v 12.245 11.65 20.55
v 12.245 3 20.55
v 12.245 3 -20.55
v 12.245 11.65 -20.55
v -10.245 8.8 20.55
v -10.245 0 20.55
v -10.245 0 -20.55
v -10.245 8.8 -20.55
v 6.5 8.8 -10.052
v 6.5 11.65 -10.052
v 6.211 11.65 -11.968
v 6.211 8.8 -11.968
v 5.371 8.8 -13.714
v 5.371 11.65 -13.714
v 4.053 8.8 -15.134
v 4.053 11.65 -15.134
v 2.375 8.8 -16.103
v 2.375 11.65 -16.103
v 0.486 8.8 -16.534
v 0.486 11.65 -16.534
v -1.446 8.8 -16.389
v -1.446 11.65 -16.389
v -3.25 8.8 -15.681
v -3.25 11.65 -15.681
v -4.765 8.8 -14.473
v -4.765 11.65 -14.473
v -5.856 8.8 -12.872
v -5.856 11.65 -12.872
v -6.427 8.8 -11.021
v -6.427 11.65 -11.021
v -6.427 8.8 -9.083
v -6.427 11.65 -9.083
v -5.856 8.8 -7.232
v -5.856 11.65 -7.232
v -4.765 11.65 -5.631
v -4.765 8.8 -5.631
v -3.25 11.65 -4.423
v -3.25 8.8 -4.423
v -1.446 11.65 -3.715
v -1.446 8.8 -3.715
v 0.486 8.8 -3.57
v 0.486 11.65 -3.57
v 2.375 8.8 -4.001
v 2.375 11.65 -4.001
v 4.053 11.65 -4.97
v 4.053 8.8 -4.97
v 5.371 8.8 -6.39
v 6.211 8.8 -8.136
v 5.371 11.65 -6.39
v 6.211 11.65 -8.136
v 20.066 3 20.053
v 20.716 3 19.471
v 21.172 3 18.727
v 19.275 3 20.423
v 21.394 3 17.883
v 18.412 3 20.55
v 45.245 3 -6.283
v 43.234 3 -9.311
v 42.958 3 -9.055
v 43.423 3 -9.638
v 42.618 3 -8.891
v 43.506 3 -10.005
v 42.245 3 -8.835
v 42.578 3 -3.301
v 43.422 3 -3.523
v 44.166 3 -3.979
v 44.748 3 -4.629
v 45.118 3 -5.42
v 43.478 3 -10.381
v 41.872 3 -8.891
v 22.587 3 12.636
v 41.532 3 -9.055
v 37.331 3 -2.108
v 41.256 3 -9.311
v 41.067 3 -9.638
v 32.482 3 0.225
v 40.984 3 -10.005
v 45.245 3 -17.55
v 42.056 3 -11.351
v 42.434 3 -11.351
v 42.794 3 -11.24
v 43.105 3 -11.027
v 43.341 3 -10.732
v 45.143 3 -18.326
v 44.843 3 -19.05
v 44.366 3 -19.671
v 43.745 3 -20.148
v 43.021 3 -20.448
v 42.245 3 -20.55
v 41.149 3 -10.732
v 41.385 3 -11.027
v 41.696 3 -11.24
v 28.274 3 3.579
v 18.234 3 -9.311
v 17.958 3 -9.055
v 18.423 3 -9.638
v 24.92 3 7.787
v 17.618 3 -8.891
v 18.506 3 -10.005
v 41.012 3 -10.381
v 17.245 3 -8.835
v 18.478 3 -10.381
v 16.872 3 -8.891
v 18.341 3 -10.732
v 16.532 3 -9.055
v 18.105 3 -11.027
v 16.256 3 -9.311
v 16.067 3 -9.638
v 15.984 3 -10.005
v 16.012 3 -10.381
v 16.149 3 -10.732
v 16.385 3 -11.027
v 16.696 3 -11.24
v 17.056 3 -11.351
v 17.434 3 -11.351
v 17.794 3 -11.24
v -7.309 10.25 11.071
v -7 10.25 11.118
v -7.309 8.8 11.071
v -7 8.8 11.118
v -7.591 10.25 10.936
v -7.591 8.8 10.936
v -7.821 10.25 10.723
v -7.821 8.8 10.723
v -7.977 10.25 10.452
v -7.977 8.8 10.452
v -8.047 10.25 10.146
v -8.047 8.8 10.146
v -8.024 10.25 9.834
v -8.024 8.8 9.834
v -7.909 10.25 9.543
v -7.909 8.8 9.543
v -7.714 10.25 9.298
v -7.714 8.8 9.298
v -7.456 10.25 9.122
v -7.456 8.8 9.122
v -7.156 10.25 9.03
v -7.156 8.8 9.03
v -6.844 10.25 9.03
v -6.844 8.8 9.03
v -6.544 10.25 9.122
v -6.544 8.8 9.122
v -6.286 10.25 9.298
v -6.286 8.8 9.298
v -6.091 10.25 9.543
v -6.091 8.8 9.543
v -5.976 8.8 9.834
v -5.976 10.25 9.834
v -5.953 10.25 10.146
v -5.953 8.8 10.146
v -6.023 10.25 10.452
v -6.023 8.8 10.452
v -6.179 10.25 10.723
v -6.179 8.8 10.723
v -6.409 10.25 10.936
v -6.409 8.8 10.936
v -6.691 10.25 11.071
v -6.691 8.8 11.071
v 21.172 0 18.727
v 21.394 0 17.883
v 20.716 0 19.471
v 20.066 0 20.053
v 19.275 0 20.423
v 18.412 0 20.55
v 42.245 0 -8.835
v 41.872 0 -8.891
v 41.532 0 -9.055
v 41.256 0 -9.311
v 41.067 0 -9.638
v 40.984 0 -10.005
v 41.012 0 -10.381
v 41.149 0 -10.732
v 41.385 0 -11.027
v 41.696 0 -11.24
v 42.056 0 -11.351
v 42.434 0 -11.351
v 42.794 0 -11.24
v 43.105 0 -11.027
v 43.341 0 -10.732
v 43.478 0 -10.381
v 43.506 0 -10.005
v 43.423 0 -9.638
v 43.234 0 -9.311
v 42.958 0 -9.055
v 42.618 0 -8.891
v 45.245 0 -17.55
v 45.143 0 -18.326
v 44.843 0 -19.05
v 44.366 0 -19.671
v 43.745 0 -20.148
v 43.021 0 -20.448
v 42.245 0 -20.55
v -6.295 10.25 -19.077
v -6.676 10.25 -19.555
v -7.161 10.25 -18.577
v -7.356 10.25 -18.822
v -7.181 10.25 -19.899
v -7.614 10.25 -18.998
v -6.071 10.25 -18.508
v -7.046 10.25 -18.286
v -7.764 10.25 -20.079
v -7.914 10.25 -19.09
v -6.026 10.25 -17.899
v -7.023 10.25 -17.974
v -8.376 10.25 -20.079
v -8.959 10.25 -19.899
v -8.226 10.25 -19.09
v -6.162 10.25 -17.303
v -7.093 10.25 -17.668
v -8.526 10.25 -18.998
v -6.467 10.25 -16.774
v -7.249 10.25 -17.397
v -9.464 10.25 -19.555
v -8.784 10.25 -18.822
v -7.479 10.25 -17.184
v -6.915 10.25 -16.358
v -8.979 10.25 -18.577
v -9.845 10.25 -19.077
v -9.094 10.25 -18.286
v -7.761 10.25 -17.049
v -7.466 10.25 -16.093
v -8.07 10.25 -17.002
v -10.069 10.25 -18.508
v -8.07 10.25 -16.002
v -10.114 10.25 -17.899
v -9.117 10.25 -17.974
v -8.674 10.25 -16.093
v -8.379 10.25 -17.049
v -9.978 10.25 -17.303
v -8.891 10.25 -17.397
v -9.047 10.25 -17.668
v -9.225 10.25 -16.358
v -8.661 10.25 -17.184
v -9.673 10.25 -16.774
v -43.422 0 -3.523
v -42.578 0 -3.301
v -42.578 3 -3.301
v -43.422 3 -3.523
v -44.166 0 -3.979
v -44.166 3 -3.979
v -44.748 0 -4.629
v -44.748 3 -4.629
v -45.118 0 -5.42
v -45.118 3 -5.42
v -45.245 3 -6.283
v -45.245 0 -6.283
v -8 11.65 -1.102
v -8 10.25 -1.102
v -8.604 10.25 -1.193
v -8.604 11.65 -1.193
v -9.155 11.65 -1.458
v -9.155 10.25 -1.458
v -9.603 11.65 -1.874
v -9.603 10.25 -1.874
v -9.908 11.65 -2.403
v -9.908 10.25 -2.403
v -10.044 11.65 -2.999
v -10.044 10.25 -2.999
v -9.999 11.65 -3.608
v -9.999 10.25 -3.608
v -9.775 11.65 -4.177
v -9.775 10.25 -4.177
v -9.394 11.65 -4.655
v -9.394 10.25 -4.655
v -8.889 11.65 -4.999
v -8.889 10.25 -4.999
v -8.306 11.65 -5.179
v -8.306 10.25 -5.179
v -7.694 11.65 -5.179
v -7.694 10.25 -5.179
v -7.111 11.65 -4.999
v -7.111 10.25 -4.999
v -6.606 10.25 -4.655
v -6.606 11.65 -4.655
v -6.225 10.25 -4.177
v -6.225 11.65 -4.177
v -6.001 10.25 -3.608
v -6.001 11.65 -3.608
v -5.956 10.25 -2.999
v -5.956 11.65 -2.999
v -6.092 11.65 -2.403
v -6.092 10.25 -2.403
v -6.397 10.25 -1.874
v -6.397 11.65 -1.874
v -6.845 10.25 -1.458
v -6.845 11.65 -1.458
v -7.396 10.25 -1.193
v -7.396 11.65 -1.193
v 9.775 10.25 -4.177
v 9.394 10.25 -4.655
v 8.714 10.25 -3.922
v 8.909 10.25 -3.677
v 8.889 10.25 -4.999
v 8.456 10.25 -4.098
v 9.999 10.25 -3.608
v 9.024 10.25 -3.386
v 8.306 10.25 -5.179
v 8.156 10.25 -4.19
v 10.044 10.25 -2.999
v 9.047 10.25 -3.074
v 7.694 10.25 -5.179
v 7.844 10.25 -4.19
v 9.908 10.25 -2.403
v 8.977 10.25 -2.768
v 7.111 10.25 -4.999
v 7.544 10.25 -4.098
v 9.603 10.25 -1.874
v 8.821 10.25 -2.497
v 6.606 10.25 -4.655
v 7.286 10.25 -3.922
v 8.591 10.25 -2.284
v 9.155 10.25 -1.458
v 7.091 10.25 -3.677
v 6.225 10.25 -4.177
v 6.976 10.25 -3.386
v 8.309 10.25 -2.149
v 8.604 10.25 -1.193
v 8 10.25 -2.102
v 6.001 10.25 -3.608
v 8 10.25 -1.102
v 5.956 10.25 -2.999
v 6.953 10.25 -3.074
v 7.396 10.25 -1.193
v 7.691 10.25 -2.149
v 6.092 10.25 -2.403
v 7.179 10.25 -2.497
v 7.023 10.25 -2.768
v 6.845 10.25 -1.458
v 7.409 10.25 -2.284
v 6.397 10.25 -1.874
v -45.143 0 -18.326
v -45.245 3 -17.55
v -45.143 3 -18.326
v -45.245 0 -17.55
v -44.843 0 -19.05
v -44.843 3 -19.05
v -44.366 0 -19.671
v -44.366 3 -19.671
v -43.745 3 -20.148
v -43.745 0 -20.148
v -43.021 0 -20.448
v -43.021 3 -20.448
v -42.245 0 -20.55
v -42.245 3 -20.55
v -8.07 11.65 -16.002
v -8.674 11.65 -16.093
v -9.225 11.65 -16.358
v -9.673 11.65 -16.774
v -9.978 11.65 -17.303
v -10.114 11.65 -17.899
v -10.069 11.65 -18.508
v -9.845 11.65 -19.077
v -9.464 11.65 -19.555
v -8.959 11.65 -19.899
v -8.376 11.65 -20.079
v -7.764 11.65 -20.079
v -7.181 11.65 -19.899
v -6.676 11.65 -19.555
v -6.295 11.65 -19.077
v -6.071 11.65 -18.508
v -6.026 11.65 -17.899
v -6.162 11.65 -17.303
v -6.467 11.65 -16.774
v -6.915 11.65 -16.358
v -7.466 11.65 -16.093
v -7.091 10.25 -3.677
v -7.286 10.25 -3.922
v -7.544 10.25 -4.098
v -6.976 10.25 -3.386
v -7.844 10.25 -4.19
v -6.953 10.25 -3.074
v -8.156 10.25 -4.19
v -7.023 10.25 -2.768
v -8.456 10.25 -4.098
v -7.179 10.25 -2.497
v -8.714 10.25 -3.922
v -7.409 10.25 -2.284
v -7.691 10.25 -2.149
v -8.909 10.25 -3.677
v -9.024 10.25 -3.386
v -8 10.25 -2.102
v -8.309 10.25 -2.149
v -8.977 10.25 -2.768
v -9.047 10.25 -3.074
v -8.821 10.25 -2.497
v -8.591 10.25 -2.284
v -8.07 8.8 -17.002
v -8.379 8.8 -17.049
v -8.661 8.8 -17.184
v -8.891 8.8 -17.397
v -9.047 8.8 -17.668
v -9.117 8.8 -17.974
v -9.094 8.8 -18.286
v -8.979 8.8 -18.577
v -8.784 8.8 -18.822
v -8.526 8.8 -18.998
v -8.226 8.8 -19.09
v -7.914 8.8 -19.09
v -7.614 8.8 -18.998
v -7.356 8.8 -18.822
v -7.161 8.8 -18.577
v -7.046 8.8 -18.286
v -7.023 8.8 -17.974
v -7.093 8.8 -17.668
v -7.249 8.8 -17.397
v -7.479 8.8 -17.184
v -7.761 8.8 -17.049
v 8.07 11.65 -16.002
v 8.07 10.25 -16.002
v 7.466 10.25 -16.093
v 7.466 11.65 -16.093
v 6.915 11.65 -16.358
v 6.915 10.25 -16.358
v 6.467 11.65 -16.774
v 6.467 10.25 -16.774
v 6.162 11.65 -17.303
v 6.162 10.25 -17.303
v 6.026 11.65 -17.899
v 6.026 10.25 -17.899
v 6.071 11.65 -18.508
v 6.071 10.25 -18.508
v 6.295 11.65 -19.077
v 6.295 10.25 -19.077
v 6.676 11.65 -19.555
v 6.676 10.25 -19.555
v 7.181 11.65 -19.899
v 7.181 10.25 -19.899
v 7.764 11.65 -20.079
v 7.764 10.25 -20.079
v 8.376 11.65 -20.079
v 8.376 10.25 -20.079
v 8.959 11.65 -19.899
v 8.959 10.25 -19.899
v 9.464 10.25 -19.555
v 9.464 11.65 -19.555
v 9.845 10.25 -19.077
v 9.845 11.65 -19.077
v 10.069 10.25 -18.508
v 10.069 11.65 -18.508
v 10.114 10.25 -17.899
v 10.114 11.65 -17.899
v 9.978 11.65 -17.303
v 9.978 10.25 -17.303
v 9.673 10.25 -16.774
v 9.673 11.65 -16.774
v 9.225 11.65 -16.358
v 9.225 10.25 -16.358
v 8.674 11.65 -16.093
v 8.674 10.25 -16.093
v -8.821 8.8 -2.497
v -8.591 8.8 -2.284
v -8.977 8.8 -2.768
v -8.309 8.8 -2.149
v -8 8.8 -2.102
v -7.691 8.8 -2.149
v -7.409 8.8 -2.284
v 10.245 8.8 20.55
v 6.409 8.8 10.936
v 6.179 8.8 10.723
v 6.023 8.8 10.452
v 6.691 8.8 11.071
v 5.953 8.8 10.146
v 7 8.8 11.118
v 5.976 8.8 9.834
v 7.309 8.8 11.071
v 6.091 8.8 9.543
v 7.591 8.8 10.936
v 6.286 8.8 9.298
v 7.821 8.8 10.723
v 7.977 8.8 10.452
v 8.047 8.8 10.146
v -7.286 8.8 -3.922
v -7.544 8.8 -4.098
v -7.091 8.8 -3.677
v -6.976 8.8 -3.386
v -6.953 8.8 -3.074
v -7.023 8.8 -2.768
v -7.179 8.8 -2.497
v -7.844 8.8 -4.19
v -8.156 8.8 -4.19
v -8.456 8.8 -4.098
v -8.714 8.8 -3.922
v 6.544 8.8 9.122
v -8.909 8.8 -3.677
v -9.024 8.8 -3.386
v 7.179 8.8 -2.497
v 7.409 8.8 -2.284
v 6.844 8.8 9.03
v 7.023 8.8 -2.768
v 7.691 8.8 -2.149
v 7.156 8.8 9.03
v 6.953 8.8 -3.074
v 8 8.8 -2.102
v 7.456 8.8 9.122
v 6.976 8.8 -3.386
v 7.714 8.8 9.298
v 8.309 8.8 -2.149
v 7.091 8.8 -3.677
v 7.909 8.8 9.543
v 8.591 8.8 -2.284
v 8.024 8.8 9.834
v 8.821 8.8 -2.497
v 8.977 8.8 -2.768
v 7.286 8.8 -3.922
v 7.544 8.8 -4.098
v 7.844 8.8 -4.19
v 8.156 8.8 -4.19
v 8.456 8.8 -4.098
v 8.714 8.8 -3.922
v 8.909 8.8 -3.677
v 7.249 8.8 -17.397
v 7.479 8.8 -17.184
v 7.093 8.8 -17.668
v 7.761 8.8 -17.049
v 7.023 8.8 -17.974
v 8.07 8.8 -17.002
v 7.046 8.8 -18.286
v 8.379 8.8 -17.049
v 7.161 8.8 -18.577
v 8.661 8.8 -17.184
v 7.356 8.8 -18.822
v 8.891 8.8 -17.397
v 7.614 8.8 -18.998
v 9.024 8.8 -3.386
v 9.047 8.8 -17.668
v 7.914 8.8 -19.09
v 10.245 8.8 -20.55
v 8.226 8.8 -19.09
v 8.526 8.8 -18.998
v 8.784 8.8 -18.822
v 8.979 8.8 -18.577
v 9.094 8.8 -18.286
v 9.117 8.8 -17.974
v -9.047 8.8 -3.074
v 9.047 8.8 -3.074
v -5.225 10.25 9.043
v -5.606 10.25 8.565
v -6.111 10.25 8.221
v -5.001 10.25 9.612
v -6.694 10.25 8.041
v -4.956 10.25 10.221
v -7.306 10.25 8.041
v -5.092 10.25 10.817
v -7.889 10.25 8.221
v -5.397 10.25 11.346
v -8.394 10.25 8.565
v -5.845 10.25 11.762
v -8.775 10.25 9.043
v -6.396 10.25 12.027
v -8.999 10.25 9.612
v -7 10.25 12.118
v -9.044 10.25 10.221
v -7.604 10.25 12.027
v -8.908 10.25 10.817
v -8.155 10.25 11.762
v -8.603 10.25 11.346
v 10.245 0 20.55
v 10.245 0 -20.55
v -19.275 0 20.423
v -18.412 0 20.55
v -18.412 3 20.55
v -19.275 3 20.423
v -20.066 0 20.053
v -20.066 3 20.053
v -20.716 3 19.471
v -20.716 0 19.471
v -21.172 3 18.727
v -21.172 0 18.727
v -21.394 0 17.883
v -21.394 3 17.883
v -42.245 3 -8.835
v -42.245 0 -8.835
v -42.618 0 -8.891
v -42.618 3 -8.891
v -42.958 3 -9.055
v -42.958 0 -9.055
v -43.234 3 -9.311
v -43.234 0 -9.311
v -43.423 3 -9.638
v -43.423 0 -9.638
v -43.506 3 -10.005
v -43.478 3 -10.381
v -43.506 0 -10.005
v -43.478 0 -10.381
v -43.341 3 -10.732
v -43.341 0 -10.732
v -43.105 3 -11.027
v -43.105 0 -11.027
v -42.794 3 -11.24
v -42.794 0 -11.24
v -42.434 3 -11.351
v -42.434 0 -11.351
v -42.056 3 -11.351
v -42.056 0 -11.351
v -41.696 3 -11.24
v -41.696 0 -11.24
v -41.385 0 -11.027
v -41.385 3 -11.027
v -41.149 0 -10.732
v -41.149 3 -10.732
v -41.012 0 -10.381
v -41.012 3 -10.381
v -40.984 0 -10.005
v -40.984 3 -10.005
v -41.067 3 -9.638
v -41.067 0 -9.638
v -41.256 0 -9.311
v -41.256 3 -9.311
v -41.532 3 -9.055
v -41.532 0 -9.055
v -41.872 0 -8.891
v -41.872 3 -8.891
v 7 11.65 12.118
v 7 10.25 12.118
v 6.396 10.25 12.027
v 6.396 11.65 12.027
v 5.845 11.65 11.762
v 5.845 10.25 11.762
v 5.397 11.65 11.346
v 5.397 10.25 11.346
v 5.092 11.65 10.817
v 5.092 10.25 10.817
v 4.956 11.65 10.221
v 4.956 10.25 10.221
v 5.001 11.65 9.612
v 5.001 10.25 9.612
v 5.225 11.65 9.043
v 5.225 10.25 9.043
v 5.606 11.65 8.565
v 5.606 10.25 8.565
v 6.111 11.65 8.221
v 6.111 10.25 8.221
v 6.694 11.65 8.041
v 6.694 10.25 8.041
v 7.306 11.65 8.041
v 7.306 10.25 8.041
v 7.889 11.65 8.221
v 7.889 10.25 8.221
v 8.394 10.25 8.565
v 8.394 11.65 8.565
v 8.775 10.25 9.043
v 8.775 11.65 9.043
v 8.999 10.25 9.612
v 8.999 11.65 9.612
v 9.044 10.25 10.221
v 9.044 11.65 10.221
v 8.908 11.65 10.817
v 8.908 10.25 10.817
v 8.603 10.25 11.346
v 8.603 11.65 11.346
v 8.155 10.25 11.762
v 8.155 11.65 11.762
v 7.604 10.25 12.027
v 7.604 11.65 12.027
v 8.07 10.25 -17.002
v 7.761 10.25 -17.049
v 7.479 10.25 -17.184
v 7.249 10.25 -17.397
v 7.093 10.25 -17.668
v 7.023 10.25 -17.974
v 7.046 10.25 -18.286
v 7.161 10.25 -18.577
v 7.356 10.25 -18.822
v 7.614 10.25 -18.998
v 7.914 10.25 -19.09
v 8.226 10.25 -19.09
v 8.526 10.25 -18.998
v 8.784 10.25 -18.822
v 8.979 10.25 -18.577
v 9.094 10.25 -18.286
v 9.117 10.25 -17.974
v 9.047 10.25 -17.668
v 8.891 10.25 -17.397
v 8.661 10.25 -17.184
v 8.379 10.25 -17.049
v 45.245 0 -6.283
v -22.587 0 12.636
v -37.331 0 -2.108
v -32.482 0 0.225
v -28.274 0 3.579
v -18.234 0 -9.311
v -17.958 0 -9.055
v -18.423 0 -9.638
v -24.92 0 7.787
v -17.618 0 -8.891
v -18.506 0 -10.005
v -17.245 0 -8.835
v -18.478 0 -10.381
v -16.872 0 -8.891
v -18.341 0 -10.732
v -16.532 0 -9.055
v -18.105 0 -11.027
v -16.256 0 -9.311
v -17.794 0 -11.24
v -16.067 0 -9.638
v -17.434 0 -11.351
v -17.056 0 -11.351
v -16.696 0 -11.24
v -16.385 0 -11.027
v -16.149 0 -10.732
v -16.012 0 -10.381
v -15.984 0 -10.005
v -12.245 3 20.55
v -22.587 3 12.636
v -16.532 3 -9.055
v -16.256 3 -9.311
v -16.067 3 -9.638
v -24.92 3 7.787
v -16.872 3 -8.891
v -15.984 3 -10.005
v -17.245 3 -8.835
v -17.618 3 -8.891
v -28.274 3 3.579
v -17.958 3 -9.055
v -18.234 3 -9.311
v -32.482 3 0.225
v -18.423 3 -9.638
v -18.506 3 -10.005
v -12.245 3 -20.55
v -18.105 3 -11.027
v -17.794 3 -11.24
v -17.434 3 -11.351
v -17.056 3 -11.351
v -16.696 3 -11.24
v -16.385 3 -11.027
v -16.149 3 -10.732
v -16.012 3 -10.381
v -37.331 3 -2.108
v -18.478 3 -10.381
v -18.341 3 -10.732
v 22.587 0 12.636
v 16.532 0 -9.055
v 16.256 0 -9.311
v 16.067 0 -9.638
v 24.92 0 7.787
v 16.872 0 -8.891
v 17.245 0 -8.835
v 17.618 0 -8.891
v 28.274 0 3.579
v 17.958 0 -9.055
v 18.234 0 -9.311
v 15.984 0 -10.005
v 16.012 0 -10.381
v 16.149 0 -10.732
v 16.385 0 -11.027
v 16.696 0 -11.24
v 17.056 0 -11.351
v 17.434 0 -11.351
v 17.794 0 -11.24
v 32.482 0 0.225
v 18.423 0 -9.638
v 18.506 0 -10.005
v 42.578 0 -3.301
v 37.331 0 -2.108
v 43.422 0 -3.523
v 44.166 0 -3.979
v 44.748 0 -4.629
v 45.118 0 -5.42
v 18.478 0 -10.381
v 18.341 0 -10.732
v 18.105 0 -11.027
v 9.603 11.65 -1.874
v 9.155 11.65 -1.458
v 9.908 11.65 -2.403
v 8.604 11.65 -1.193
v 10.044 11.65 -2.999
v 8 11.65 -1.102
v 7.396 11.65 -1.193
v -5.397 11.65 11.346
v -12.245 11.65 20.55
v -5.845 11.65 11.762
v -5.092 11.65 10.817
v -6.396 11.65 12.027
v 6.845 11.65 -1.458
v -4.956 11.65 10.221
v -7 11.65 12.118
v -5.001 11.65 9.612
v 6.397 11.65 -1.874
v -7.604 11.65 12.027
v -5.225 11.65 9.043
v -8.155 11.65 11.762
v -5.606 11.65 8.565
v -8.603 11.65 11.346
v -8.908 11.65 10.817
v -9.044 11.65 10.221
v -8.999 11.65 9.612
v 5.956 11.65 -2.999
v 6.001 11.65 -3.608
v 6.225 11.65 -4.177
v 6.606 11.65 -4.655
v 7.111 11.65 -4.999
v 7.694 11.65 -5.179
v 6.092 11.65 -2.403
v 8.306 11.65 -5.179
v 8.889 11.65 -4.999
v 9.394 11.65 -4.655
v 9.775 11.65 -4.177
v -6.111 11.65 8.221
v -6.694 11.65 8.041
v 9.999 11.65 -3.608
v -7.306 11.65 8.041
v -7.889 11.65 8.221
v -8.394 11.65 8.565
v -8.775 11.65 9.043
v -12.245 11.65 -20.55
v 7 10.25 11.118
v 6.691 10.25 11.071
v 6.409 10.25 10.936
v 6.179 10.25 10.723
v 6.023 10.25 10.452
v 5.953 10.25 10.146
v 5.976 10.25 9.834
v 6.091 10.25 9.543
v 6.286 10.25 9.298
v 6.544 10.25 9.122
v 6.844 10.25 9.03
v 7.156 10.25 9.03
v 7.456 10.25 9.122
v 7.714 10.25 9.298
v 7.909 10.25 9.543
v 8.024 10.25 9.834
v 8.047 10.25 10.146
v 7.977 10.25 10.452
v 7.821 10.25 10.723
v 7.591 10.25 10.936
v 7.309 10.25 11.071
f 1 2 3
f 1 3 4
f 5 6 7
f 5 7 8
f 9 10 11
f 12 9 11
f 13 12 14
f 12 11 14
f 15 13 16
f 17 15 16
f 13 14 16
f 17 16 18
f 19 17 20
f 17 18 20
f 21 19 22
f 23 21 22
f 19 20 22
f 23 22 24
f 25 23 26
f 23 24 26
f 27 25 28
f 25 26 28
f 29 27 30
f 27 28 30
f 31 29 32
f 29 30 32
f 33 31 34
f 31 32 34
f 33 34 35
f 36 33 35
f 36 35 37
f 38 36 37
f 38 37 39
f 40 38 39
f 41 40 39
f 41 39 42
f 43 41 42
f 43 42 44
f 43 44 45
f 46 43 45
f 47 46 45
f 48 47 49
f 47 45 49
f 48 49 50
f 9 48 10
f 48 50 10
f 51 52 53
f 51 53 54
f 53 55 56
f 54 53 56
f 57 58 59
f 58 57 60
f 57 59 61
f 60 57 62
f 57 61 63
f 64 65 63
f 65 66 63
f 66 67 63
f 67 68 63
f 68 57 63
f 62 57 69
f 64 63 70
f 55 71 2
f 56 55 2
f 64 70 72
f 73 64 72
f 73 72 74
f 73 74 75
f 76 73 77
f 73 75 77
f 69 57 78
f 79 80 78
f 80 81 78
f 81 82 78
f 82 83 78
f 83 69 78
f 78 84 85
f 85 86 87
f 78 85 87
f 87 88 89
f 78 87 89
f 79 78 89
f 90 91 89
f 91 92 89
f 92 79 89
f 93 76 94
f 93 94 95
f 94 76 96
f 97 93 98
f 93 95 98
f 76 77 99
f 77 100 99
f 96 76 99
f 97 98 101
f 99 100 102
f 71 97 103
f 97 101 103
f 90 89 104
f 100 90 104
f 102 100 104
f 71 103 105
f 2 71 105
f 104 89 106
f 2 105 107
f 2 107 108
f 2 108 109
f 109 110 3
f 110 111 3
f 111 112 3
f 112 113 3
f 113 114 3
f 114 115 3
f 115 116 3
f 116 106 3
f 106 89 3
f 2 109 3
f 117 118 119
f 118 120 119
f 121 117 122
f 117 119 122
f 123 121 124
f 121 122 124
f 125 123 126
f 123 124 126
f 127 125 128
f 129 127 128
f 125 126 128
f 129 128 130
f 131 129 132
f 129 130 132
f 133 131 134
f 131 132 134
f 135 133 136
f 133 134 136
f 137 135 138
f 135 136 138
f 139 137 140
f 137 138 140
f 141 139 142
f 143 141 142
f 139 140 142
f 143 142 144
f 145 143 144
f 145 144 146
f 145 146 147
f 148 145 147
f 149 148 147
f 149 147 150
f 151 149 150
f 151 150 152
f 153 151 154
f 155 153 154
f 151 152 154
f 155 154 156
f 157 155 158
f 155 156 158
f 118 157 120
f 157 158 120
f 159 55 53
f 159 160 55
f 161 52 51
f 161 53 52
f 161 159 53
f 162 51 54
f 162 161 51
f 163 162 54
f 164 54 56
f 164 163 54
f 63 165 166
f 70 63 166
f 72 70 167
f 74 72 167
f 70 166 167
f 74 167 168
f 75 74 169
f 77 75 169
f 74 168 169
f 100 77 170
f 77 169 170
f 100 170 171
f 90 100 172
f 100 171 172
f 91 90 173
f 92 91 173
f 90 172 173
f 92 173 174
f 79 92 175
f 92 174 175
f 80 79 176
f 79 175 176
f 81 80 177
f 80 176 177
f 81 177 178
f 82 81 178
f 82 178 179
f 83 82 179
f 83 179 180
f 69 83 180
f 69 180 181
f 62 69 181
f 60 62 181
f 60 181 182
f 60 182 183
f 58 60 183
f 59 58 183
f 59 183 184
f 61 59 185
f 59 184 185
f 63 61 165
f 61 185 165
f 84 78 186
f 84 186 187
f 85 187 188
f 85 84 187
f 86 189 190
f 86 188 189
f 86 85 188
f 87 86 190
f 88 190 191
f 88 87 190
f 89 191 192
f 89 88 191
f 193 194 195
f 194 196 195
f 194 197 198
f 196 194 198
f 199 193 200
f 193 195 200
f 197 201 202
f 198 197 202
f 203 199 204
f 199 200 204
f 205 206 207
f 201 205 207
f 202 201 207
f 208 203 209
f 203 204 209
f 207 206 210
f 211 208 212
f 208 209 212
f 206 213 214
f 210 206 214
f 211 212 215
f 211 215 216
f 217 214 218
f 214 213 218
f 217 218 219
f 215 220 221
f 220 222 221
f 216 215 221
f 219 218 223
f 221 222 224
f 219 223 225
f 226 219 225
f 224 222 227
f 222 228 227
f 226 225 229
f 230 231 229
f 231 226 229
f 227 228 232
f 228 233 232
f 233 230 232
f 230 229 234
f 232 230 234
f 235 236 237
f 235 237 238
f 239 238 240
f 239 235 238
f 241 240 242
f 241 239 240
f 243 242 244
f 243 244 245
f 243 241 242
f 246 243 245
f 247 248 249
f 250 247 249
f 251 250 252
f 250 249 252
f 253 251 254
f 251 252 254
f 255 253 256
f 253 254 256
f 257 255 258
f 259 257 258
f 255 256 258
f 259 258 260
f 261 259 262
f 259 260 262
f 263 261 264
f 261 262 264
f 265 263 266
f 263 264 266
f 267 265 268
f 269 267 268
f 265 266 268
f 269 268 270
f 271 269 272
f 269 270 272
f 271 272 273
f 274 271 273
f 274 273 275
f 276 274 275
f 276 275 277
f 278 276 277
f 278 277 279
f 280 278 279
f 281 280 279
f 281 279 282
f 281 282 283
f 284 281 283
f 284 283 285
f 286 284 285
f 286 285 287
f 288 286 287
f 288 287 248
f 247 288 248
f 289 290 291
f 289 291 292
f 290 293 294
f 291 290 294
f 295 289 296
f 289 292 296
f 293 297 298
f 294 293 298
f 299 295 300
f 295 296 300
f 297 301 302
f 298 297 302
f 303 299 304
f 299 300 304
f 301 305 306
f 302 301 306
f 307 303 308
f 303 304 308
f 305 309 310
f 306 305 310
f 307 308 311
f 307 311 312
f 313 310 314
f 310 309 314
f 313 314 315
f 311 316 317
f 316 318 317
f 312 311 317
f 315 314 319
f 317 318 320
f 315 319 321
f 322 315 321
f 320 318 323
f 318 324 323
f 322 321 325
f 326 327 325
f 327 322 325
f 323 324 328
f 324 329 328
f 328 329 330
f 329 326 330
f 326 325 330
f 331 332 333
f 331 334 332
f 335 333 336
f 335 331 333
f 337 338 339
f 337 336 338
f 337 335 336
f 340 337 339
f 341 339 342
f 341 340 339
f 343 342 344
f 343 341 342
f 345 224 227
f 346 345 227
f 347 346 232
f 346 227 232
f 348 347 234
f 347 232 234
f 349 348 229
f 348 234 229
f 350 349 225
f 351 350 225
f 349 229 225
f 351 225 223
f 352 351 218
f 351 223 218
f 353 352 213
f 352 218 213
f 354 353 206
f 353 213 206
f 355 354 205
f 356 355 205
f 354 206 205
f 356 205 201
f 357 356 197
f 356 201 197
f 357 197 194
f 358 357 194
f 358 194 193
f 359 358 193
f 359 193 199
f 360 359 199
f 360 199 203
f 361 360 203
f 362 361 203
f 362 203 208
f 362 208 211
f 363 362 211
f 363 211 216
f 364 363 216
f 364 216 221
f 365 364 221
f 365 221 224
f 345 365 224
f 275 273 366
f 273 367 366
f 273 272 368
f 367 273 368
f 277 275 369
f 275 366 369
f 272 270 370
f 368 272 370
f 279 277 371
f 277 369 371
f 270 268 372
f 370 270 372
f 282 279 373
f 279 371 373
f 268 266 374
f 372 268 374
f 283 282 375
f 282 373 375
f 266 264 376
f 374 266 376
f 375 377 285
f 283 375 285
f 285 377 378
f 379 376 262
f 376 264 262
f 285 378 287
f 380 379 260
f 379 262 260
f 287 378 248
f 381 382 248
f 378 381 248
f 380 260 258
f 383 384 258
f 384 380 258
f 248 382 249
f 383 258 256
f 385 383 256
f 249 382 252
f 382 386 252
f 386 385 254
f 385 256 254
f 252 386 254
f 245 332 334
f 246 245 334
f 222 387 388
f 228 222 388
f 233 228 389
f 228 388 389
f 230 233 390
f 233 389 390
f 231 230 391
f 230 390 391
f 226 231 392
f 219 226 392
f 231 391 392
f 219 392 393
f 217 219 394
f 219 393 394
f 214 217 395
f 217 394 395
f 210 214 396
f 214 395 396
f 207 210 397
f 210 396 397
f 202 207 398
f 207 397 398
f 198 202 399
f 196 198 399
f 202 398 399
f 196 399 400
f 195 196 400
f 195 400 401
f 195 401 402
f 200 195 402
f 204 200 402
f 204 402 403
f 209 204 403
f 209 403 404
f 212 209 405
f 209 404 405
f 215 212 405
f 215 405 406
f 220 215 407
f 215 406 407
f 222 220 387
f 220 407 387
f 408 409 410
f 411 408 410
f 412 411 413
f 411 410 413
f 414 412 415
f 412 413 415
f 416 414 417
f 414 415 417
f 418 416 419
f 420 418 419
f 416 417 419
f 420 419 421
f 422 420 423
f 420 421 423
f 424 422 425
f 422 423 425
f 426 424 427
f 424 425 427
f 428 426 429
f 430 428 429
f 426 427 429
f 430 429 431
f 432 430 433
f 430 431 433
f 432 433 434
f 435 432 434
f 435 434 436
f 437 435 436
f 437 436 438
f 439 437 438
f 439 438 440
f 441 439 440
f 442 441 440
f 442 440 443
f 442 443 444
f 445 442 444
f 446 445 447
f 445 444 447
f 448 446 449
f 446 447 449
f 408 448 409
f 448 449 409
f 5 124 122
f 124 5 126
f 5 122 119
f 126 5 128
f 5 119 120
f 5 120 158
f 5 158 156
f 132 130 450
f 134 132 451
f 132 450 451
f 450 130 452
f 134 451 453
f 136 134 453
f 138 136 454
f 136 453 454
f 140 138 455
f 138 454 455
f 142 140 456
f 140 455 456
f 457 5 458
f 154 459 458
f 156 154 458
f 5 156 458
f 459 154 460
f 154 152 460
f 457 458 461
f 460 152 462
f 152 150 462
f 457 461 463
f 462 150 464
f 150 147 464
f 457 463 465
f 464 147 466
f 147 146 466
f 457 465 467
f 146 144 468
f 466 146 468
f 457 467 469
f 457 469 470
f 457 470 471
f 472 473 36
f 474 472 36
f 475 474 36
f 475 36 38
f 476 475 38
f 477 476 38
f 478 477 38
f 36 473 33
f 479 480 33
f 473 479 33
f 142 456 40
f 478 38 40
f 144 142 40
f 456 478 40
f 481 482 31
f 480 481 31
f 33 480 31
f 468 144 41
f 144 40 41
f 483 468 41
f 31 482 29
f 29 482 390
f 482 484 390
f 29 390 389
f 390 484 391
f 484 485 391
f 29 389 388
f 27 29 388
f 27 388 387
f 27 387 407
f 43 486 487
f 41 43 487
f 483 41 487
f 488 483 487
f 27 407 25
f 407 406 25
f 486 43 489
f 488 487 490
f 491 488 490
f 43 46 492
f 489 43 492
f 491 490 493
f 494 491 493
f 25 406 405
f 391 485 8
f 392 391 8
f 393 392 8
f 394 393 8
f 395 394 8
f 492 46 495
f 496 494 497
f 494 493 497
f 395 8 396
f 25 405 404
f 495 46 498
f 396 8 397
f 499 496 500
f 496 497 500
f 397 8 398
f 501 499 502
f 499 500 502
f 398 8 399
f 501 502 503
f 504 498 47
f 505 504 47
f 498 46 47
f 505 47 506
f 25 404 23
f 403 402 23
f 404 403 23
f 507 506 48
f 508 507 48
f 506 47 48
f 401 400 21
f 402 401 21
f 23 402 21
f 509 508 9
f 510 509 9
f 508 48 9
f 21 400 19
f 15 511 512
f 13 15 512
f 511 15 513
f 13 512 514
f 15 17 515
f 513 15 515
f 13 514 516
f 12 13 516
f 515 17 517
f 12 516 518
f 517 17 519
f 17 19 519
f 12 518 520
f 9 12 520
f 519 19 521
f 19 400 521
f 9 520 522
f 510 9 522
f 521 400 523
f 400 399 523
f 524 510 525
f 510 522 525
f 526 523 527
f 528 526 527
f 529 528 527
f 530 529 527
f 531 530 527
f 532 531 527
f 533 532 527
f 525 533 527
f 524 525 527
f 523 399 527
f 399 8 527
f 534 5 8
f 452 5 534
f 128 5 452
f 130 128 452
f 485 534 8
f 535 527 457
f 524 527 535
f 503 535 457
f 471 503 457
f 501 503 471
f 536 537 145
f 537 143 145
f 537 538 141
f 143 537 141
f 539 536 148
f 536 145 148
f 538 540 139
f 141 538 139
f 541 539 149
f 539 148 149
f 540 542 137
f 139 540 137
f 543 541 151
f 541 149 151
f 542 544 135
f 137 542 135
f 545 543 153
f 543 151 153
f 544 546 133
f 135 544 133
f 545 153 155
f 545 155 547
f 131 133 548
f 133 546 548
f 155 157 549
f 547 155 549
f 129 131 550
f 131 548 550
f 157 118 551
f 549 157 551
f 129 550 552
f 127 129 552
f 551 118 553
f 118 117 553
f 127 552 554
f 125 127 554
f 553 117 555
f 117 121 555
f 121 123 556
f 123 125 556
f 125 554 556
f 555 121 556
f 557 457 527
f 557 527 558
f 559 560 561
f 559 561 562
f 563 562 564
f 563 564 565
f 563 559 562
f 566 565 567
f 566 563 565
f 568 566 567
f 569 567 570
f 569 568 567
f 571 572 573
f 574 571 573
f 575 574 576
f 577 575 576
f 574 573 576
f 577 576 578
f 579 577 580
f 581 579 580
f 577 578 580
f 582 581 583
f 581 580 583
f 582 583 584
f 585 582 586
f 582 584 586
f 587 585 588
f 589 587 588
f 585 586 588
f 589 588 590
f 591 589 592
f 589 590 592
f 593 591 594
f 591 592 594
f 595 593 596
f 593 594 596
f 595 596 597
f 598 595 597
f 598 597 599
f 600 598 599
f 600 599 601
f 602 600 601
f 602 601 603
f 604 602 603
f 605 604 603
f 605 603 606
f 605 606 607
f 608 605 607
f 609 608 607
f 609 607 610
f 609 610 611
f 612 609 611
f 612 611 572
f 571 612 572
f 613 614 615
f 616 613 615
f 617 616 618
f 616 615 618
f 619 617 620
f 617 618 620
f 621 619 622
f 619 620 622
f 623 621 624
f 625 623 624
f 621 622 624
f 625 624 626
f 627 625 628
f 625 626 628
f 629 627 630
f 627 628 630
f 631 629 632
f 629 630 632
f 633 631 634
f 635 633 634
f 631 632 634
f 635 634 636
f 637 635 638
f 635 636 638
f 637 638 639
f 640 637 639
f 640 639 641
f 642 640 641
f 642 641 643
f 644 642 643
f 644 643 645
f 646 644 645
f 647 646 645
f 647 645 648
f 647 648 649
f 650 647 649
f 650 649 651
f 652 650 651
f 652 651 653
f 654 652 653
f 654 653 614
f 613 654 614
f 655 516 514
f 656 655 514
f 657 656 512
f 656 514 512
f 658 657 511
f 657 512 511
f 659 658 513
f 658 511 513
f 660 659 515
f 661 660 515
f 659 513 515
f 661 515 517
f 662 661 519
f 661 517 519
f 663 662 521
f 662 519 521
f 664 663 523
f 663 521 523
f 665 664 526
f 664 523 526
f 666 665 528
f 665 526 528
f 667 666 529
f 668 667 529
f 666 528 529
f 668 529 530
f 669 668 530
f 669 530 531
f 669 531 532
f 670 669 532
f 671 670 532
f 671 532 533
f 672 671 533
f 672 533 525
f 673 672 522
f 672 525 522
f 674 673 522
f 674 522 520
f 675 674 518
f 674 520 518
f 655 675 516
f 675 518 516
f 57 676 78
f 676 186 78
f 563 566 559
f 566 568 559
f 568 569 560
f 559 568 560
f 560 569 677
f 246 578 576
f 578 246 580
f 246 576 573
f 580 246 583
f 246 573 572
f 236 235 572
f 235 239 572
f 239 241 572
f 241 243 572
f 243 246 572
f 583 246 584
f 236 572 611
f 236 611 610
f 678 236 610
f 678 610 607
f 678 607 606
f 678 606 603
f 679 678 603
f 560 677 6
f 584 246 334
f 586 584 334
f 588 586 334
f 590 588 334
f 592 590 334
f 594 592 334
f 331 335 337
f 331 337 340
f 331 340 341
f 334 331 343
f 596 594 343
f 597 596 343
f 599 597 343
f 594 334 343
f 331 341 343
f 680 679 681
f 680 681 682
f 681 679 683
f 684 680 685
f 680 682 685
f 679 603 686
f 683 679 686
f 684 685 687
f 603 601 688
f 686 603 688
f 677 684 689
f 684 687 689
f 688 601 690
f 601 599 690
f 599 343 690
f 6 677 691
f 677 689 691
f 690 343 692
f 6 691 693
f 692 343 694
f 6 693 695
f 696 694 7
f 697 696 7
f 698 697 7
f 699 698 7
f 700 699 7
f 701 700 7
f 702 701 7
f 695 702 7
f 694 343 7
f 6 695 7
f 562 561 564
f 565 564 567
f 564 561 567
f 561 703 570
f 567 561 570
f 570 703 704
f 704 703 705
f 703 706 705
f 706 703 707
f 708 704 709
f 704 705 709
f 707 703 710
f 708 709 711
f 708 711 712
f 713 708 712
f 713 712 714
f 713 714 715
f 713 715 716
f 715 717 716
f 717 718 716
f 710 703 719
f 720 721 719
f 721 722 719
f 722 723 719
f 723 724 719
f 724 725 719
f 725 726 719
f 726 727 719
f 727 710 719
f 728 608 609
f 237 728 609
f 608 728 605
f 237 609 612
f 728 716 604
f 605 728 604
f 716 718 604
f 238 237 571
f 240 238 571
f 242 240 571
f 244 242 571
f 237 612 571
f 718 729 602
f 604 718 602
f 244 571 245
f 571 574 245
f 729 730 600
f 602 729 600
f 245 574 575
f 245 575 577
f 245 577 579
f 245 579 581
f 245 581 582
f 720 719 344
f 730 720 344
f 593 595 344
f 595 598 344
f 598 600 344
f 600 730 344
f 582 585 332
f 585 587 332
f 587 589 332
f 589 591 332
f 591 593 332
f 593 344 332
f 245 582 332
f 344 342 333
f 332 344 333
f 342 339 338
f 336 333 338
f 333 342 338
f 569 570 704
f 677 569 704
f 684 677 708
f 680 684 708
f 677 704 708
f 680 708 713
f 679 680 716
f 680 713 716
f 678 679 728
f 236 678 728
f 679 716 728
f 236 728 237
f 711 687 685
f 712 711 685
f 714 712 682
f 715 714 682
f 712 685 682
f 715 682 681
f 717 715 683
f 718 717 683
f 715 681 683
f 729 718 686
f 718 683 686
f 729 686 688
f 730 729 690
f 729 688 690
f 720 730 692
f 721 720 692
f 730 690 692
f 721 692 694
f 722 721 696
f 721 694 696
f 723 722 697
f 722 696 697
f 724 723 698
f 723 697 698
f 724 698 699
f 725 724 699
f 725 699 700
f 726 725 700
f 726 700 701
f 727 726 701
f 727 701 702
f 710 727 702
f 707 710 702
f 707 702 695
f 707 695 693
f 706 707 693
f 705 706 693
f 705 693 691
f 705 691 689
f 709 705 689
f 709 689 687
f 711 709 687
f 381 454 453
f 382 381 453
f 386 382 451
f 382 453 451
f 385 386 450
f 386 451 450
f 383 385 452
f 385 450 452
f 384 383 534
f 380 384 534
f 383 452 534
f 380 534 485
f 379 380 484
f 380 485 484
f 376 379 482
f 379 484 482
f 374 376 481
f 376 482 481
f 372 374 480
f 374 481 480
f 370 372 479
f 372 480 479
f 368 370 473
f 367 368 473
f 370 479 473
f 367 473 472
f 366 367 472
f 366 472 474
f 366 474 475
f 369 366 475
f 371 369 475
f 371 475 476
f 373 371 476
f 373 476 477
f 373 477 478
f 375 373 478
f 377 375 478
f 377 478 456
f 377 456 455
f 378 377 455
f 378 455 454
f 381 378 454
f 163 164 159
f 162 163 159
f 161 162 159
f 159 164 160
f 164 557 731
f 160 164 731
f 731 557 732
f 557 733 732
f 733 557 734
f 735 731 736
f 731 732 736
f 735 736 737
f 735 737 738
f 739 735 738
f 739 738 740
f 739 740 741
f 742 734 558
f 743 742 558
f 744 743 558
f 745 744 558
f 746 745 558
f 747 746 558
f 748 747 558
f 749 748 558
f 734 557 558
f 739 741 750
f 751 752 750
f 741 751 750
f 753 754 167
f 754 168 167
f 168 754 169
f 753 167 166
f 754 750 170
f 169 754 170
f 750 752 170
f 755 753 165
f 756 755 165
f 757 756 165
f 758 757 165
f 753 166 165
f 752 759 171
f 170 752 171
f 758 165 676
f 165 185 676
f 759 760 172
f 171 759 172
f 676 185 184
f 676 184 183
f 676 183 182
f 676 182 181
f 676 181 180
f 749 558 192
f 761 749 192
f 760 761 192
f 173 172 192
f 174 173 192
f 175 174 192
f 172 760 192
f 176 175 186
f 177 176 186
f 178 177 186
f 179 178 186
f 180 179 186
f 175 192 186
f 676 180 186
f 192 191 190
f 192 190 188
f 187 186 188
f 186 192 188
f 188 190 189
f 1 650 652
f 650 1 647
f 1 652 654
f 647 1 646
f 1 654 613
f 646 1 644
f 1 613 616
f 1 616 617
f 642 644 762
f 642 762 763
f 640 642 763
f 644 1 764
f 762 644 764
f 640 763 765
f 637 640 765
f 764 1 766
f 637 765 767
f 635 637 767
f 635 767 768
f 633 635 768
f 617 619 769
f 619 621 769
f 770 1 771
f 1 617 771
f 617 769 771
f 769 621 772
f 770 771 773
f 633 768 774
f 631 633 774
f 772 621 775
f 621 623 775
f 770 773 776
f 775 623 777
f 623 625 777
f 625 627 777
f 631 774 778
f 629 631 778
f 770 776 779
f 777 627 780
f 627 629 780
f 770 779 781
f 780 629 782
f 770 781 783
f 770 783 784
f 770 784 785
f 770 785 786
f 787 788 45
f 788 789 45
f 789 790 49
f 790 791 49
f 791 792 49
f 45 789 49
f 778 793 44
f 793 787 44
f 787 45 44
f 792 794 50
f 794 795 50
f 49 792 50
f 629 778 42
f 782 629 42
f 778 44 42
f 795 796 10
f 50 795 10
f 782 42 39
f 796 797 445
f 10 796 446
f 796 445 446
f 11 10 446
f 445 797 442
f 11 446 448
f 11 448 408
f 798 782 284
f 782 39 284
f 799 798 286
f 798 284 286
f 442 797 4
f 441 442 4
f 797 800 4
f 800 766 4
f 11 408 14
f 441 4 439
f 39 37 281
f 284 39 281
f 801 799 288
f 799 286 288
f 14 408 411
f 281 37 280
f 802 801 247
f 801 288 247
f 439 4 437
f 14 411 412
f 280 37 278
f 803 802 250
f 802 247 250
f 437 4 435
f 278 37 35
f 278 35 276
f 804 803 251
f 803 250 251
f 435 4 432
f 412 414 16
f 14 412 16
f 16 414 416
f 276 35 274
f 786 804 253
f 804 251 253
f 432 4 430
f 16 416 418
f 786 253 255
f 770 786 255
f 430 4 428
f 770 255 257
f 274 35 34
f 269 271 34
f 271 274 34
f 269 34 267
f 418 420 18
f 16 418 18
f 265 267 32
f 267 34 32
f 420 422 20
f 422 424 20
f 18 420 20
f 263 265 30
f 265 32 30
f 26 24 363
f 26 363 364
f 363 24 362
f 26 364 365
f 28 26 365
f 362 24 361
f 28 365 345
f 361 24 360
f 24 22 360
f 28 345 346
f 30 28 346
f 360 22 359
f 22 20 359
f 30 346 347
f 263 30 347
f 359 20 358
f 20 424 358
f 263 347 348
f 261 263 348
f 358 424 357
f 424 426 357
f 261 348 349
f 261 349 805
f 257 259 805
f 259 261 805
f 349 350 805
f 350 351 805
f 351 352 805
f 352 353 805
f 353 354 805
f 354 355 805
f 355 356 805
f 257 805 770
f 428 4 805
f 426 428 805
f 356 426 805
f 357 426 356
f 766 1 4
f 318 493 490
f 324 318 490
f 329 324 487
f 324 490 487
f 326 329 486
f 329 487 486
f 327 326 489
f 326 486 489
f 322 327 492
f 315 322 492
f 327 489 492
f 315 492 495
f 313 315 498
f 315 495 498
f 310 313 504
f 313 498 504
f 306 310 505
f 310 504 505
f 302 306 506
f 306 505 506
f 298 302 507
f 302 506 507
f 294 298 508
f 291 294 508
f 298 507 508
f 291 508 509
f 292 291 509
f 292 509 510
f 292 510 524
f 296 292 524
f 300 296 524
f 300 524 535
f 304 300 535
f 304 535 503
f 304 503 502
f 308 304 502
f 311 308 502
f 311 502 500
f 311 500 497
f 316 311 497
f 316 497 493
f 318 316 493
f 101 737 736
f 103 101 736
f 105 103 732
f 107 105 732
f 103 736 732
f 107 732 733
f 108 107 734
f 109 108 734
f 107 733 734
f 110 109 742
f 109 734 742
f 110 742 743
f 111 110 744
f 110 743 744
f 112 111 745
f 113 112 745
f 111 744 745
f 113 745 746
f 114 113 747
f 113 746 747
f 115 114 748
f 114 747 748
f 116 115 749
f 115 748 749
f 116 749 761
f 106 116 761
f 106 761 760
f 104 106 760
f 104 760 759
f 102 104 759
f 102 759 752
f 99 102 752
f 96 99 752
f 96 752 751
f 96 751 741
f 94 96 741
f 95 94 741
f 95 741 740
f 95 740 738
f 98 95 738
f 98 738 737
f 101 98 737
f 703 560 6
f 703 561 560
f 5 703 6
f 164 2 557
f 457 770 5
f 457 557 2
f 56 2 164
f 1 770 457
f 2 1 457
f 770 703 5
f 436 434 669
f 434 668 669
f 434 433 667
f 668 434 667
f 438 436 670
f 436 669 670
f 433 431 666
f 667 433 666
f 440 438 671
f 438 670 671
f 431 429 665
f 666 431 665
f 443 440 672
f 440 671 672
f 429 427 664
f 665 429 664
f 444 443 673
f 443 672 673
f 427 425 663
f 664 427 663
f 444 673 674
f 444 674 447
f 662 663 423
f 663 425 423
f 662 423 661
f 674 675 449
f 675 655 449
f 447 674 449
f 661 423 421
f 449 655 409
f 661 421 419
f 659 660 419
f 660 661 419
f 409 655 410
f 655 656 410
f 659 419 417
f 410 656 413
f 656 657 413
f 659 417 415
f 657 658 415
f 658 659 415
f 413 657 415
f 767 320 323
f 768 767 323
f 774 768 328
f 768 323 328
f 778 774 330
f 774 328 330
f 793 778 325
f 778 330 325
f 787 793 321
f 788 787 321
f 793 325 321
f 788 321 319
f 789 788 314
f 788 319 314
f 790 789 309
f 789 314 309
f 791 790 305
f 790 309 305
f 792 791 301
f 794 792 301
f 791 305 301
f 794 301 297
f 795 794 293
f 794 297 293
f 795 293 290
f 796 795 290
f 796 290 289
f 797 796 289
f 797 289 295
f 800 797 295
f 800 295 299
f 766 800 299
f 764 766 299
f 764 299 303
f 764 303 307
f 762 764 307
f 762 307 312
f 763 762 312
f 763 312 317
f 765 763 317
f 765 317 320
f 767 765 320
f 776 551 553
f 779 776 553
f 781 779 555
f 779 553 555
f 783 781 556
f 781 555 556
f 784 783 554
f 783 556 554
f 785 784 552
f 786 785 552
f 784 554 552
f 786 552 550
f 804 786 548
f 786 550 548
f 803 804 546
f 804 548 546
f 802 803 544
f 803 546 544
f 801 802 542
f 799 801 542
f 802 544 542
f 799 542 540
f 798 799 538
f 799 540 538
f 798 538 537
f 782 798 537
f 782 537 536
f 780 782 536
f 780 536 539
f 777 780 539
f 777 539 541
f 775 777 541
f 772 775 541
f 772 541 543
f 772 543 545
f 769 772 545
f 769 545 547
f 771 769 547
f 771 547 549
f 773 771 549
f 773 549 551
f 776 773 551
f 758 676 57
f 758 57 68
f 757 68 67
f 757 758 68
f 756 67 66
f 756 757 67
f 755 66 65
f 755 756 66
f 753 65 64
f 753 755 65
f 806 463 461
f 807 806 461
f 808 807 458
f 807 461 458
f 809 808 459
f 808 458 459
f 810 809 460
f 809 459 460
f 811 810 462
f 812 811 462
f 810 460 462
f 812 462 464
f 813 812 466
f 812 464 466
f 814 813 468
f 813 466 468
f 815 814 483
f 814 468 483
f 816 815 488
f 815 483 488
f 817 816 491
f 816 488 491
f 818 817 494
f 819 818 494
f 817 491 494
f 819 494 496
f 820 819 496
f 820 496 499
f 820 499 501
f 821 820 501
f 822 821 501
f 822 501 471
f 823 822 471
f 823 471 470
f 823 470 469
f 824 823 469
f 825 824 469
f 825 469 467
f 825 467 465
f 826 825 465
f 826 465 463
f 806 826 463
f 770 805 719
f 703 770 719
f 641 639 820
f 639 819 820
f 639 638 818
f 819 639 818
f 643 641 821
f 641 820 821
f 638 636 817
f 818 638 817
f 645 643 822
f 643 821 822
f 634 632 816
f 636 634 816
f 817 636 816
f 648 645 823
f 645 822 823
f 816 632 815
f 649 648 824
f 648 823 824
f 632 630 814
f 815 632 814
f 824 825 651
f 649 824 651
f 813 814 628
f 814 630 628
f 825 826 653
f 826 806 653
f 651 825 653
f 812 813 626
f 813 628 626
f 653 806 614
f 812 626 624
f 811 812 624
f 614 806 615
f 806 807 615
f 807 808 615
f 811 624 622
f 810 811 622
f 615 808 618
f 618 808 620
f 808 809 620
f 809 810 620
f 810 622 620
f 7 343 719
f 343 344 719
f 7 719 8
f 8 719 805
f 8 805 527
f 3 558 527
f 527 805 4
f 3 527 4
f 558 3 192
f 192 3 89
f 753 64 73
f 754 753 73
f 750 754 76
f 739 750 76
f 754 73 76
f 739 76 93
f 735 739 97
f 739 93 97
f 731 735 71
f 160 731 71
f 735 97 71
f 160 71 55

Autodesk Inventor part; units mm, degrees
ref_plane "YZ Plane" through (0, 0, 0) normal (1, 0, 0) x (0, 1, 0)
ref_plane "XZ Plane" through (0, 0, 0) normal (0, 1, 0) x (-1, 0, 0)
ref_plane "XY Plane" through (0, 0, 0) normal (0, 0, 1) x (1, 0, 0)
sketch "Sketch1" plane through (0, 0, 0) normal (0, 0, 1) x (1, 0, 0)
  line L0 (-12.245, 11.65) -> (-12.245, 3)
  line L1 (-12.245, 3) -> (-45.245, 3)
  line L2 (-45.245, 3) -> (-45.245, 0)
  line L3 (-45.245, 0) -> (-10.245, 0)
  line L4 (-10.245, 0) -> (-10.245, 8.8)
  line L5 (-10.245, 8.8) -> (10.245, 8.8)
  line L6 (10.245, 8.8) -> (10.245, 0)
  line L7 (10.245, 0) -> (45.245, 0)
  line L8 (45.245, 0) -> (45.245, 3)
  line L9 (45.245, 3) -> (12.245, 3)
  line L10 (12.245, 3) -> (12.245, 11.65)
  line L11 (12.245, 11.65) -> (-12.245, 11.65)
  line L12 (-10.245, 0) -> (10.245, 0) construction
  point P0 (0, 0)
  point P1 (0, 11.65)
  point P2 (0, 0)
  point P3 (-12.245, 7.325)
  point P4 (12.245, 7.325)
  dimension "d0" = 20.49
  dimension "d1" = 2.85
  dimension "d3" = 5.8
  dimension "d4" = 3
  dimension "d5" = 3
  dimension "d6" = 35
  dimension "d7" = 35
  dimension "d73" = 33
  dimension "d74" = 33
extrude "Extrusion1" add sketch "Sketch1" along normal mid plane 41.1
sketch "Sketch8" plane through (12.245, 3, 20.55) normal (0, 1, 0) x (1, 0, 0)
  line L0 (0, 41.1) -> (0, 0)
  line L1 (33, 0) -> (0, 0) projected
  line L2 (33, 41.1) -> (33, 0) projected
  line L3 (0, 41.1) -> (33, 41.1) projected
  line L4 (-57.49, 41.1) -> (-57.49, 0) projected
  line L5 (-24.49, 0) -> (-57.49, 0) projected
  line L6 (-24.49, 0) -> (-24.49, 41.1) projected
  line L7 (-57.49, 41.1) -> (-24.49, 41.1) projected
  line L8 (33, 41.1) -> (33, 0) projected
  circle A0 centre (-11.645, 30.6) radius 6.4 projected
  line L9 (-12.245, 41) -> (-12.245, 0) construction
  point P0 (-12.245, 20.55)
  point P1 (-54.49, 30.65)
  point P2 (-29.49, 30.65)
  point P3 (-57.49, 20.55)
  point P4 (30, 30.65)
  point P5 (5, 30.65)
  dimension "d42" = 3
  dimension "d43" = 25
  dimension "d51" = 10.45
  dimension "d53" = 3
hole "Hole1" at (-42.245, 3, -10.1) at (-17.245, 3, -10.1) at (17.245, 3, -10.1) at (42.245, 3, -10.1) direction (0, -1, 0) diameter 2.53 end through all
sketch "Sketch9" plane through (12.245, 3, 20.55) normal (0, 1, 0) x (1, 0, 0)
  circle A0 centre (30, 30.65) radius 1.265 projected
  circle A1 centre (5, 30.65) radius 1.265 projected
  line L0 (0, 41.1) -> (0, 0) projected
  line L1 (33, 0) -> (0, 0) projected
  line L2 (33, 41.1) -> (33, 0) projected
  line L3 (0, 41.1) -> (33, 41.1) projected
  arc A2 (33, 24) -> (9, 0) centre (33, 0) ccw
  point P0 (-12.245, 20.55)
  dimension "d60" = 24
extrude "Extrusion2" cut sketch "Sketch9" against normal blind 10 contours A2 L2 L1
mirror "Mirror1" about plane through (0, 0, 0) normal (1, 0, 0) of "Extrusion2"
sketch "Sketch10" plane through (-12.245, 11.65, 20.55) normal (0, 1, 0) x (1, 0, 0)
  circle A0 centre (12.245, 30.602) radius 6.5
  line L0 (0, 41.1) -> (0, 0) projected
  line L1 (24.49, 0) -> (0, 0) projected
  line L2 (24.49, 41.1) -> (24.49, 0) projected
  line L3 (0, 41.1) -> (24.49, 41.1) projected
  point P0 (12.245, 20.55)
  point P1 (12.245, 41.1)
  dimension "d75" = 13
  dimension "d76" = 10.498
extrude "Extrusion3" cut sketch "Sketch10" against normal blind 10 contours A0
sketch "Sketch11" plane through (-12.245, 11.65, 20.55) normal (0, 1, 0) x (1, 0, 0)
  circle A0 centre (5.245, 10.482) radius 0.7835
  circle A1 centre (4.245, 23.702) radius 0.7835
  circle A2 centre (4.175, 38.602) radius 0.7835
  circle A3 centre (20.315, 38.602) radius 0.7835
  circle A4 centre (20.245, 23.702) radius 0.7835
  circle A5 centre (19.245, 10.482) radius 0.7835
hole "Hole2" at (-8, 11.65, -3.152) at (8, 11.65, -3.152) at (8.07, 11.65, -18.052) at (-8.07, 11.65, -18.052) at (-7, 11.65, 10.068) at (7, 11.65, 10.068) direction (0, -1, 0) diameter 2.1 end through all counterbore diameter 4.1 counterbore depth 1.4
fillet "Fillet3" radius 3 6 edges at (45.245, 1.5, -20.55) (45.245, 1.5, -3.45) (21.245, 1.5, 20.55) (-21.245, 1.5, 20.55) (-45.245, 1.5, -3.45) (-45.245, 1.5, -20.55)
sketch "Sketch15" plane through (-10.245, 8.8, 20.55) normal (0, -1, 0) x (1, 0, 0)
  line L0 (0, -41.1) -> (0, 0) projected
  line L1 (20.49, -41.1) -> (20.49, 0) projected
  line L2 (0, -41.1) -> (0, -44.1)
  line L3 (0, -44.1) -> (20.49, -44.1)
  line L4 (20.49, -44.1) -> (20.49, -41.1)
  line L5 (0, 0) -> (0, 3)
  line L6 (0, 3) -> (20.49, 3)
  line L7 (20.49, 3) -> (20.49, 0)
  line L8 (0, -44.1) -> (0, 3)
  line L9 (20.49, 3) -> (20.49, -44.1)
  point P0 (10.245, -20.55)
  point P1 (0, 1.5)
  dimension "d126" = 3
  dimension "d127" = 3
sketch "Sketch16" plane through (-12.245, 11.65, 20.55) normal (0, 1, 0) x (1, 0, 0)
  line L0 (-30, 41.1) -> (0, 41.1) projected
  arc A0 (-30, 41.1) -> (-33, 38.1) centre (-30, 38.1) ccw projected
  line L1 (-33, 38.1) -> (-33, 26.8328) projected
  arc A1 (-33, 26.8328) -> (-30.3333, 23.8514) centre (-30, 26.8328) ccw projected
  arc A2 (-9.1486, 2.6667) -> (-30.3333, 23.8514) centre (-33, 0) ccw projected
  arc A3 (-9.1486, 2.6667) -> (-6.1672, 0) centre (-6.1672, 3) ccw projected
  line L2 (0, 0) -> (-6.1672, 0) projected
  line L3 (24.49, 0) -> (0, 0) projected
  line L4 (30.6572, 0) -> (24.49, 0) projected
  arc A4 (30.6572, 0) -> (33.6386, 2.6667) centre (30.6572, 3) ccw projected
  arc A5 (54.8233, 23.8514) -> (33.6386, 2.6667) centre (57.49, 0) ccw projected
  arc A6 (54.8233, 23.8514) -> (57.49, 26.8328) centre (54.49, 26.8328) ccw projected
  line L5 (57.49, 38.1) -> (57.49, 26.8328) projected
  arc A7 (57.49, 38.1) -> (54.49, 41.1) centre (54.49, 38.1) ccw projected
  line L6 (24.49, 41.1) -> (54.49, 41.1) projected
  line L7 (0, 41.1) -> (24.49, 41.1) projected
  point P0 (12.245, 20.55)
sketch "Sketch17" plane through (-12.245, 3, 20.55) normal (0, 1, 0) x (1, 0, 0)
  line L0 (0, 0) -> (0, 41.1) projected
  line L1 (-30, 41.1) -> (0, 41.1) projected
  arc A0 (-30, 41.1) -> (-33, 38.1) centre (-30, 38.1) ccw projected
  line L2 (-33, 38.1) -> (-33, 26.8328) projected
  arc A1 (-33, 26.8328) -> (-30.3333, 23.8514) centre (-30, 26.8328) ccw projected
  arc A2 (-9.1486, 2.6667) -> (-30.3333, 23.8514) centre (-33, 0) ccw projected
  arc A3 (-9.1486, 2.6667) -> (-6.1672, 0) centre (-6.1672, 3) ccw projected
  line L3 (0, 0) -> (-6.1672, 0) projected
  line L4 (30.6572, 0) -> (24.49, 0) projected
  arc A4 (30.6572, 0) -> (33.6386, 2.6667) centre (30.6572, 3) ccw projected
  arc A5 (54.8233, 23.8514) -> (33.6386, 2.6667) centre (57.49, 0) ccw projected
  arc A6 (54.8233, 23.8514) -> (57.49, 26.8328) centre (54.49, 26.8328) ccw projected
  line L5 (57.49, 38.1) -> (57.49, 26.8328) projected
  line L6 (24.49, 41.1) -> (54.49, 41.1) projected
  arc A7 (57.49, 38.1) -> (54.49, 41.1) centre (54.49, 38.1) ccw projected
  line L7 (24.49, 41.1) -> (24.49, 0) projected
  arc A8 (-36, 26.8328) -> (-30.6667, 20.87) centre (-30, 26.8328) ccw
  line L8 (-36, 26.8328) -> (-36, 38.1)
  arc A9 (-30, 44.1) -> (-36, 38.1) centre (-30, 38.1) ccw
  line L9 (-30, 44.1) -> (0, 44.1)
  line L10 (0, -3) -> (-6.1672, -3)
  arc A10 (-12.13, 2.3333) -> (-6.1672, -3) centre (-6.1672, 3) ccw
  arc A11 (-12.13, 2.3333) -> (-30.6667, 20.87) centre (-33, 0) ccw
  arc A12 (30.6572, -3) -> (36.62, 2.3333) centre (30.6572, 3) ccw
  line L11 (30.6572, -3) -> (24.49, -3)
  line L12 (24.49, 44.1) -> (54.49, 44.1)
  arc A13 (60.49, 38.1) -> (54.49, 44.1) centre (54.49, 38.1) ccw
  line L13 (60.49, 38.1) -> (60.49, 26.8328)
  arc A14 (55.1567, 20.87) -> (60.49, 26.8328) centre (54.49, 26.8328) ccw
  arc A15 (55.1567, 20.87) -> (36.62, 2.3333) centre (57.49, 0) ccw
  line L14 (0, 0) -> (0, -3)
  line L15 (0, 41.1) -> (0, 44.1)
  line L16 (24.49, 41.1) -> (24.49, 44.1)
  line L17 (24.49, 0) -> (24.49, -3)
  line L18 (0, 44.1) -> (0, -3)
  line L19 (24.49, -3) -> (24.49, 44.1)
  line L20 (-33, 38.1) -> (-33, 26.8328) projected
  point P0 (12.245, 20.55)
  dimension "d136" = 3
  dimension "d137" = 3
  dimension "d138" = 3
  dimension "d139" = 3
  dimension "d140" = 3
  dimension "d141" = 3
  dimension "d142" = 3
  dimension "d143" = 3
ref_plane "Work Plane1" through (0, 0, 0) normal (1, 0, 0) x (0, 1, 0)
properties part number "gripper_fixer"
